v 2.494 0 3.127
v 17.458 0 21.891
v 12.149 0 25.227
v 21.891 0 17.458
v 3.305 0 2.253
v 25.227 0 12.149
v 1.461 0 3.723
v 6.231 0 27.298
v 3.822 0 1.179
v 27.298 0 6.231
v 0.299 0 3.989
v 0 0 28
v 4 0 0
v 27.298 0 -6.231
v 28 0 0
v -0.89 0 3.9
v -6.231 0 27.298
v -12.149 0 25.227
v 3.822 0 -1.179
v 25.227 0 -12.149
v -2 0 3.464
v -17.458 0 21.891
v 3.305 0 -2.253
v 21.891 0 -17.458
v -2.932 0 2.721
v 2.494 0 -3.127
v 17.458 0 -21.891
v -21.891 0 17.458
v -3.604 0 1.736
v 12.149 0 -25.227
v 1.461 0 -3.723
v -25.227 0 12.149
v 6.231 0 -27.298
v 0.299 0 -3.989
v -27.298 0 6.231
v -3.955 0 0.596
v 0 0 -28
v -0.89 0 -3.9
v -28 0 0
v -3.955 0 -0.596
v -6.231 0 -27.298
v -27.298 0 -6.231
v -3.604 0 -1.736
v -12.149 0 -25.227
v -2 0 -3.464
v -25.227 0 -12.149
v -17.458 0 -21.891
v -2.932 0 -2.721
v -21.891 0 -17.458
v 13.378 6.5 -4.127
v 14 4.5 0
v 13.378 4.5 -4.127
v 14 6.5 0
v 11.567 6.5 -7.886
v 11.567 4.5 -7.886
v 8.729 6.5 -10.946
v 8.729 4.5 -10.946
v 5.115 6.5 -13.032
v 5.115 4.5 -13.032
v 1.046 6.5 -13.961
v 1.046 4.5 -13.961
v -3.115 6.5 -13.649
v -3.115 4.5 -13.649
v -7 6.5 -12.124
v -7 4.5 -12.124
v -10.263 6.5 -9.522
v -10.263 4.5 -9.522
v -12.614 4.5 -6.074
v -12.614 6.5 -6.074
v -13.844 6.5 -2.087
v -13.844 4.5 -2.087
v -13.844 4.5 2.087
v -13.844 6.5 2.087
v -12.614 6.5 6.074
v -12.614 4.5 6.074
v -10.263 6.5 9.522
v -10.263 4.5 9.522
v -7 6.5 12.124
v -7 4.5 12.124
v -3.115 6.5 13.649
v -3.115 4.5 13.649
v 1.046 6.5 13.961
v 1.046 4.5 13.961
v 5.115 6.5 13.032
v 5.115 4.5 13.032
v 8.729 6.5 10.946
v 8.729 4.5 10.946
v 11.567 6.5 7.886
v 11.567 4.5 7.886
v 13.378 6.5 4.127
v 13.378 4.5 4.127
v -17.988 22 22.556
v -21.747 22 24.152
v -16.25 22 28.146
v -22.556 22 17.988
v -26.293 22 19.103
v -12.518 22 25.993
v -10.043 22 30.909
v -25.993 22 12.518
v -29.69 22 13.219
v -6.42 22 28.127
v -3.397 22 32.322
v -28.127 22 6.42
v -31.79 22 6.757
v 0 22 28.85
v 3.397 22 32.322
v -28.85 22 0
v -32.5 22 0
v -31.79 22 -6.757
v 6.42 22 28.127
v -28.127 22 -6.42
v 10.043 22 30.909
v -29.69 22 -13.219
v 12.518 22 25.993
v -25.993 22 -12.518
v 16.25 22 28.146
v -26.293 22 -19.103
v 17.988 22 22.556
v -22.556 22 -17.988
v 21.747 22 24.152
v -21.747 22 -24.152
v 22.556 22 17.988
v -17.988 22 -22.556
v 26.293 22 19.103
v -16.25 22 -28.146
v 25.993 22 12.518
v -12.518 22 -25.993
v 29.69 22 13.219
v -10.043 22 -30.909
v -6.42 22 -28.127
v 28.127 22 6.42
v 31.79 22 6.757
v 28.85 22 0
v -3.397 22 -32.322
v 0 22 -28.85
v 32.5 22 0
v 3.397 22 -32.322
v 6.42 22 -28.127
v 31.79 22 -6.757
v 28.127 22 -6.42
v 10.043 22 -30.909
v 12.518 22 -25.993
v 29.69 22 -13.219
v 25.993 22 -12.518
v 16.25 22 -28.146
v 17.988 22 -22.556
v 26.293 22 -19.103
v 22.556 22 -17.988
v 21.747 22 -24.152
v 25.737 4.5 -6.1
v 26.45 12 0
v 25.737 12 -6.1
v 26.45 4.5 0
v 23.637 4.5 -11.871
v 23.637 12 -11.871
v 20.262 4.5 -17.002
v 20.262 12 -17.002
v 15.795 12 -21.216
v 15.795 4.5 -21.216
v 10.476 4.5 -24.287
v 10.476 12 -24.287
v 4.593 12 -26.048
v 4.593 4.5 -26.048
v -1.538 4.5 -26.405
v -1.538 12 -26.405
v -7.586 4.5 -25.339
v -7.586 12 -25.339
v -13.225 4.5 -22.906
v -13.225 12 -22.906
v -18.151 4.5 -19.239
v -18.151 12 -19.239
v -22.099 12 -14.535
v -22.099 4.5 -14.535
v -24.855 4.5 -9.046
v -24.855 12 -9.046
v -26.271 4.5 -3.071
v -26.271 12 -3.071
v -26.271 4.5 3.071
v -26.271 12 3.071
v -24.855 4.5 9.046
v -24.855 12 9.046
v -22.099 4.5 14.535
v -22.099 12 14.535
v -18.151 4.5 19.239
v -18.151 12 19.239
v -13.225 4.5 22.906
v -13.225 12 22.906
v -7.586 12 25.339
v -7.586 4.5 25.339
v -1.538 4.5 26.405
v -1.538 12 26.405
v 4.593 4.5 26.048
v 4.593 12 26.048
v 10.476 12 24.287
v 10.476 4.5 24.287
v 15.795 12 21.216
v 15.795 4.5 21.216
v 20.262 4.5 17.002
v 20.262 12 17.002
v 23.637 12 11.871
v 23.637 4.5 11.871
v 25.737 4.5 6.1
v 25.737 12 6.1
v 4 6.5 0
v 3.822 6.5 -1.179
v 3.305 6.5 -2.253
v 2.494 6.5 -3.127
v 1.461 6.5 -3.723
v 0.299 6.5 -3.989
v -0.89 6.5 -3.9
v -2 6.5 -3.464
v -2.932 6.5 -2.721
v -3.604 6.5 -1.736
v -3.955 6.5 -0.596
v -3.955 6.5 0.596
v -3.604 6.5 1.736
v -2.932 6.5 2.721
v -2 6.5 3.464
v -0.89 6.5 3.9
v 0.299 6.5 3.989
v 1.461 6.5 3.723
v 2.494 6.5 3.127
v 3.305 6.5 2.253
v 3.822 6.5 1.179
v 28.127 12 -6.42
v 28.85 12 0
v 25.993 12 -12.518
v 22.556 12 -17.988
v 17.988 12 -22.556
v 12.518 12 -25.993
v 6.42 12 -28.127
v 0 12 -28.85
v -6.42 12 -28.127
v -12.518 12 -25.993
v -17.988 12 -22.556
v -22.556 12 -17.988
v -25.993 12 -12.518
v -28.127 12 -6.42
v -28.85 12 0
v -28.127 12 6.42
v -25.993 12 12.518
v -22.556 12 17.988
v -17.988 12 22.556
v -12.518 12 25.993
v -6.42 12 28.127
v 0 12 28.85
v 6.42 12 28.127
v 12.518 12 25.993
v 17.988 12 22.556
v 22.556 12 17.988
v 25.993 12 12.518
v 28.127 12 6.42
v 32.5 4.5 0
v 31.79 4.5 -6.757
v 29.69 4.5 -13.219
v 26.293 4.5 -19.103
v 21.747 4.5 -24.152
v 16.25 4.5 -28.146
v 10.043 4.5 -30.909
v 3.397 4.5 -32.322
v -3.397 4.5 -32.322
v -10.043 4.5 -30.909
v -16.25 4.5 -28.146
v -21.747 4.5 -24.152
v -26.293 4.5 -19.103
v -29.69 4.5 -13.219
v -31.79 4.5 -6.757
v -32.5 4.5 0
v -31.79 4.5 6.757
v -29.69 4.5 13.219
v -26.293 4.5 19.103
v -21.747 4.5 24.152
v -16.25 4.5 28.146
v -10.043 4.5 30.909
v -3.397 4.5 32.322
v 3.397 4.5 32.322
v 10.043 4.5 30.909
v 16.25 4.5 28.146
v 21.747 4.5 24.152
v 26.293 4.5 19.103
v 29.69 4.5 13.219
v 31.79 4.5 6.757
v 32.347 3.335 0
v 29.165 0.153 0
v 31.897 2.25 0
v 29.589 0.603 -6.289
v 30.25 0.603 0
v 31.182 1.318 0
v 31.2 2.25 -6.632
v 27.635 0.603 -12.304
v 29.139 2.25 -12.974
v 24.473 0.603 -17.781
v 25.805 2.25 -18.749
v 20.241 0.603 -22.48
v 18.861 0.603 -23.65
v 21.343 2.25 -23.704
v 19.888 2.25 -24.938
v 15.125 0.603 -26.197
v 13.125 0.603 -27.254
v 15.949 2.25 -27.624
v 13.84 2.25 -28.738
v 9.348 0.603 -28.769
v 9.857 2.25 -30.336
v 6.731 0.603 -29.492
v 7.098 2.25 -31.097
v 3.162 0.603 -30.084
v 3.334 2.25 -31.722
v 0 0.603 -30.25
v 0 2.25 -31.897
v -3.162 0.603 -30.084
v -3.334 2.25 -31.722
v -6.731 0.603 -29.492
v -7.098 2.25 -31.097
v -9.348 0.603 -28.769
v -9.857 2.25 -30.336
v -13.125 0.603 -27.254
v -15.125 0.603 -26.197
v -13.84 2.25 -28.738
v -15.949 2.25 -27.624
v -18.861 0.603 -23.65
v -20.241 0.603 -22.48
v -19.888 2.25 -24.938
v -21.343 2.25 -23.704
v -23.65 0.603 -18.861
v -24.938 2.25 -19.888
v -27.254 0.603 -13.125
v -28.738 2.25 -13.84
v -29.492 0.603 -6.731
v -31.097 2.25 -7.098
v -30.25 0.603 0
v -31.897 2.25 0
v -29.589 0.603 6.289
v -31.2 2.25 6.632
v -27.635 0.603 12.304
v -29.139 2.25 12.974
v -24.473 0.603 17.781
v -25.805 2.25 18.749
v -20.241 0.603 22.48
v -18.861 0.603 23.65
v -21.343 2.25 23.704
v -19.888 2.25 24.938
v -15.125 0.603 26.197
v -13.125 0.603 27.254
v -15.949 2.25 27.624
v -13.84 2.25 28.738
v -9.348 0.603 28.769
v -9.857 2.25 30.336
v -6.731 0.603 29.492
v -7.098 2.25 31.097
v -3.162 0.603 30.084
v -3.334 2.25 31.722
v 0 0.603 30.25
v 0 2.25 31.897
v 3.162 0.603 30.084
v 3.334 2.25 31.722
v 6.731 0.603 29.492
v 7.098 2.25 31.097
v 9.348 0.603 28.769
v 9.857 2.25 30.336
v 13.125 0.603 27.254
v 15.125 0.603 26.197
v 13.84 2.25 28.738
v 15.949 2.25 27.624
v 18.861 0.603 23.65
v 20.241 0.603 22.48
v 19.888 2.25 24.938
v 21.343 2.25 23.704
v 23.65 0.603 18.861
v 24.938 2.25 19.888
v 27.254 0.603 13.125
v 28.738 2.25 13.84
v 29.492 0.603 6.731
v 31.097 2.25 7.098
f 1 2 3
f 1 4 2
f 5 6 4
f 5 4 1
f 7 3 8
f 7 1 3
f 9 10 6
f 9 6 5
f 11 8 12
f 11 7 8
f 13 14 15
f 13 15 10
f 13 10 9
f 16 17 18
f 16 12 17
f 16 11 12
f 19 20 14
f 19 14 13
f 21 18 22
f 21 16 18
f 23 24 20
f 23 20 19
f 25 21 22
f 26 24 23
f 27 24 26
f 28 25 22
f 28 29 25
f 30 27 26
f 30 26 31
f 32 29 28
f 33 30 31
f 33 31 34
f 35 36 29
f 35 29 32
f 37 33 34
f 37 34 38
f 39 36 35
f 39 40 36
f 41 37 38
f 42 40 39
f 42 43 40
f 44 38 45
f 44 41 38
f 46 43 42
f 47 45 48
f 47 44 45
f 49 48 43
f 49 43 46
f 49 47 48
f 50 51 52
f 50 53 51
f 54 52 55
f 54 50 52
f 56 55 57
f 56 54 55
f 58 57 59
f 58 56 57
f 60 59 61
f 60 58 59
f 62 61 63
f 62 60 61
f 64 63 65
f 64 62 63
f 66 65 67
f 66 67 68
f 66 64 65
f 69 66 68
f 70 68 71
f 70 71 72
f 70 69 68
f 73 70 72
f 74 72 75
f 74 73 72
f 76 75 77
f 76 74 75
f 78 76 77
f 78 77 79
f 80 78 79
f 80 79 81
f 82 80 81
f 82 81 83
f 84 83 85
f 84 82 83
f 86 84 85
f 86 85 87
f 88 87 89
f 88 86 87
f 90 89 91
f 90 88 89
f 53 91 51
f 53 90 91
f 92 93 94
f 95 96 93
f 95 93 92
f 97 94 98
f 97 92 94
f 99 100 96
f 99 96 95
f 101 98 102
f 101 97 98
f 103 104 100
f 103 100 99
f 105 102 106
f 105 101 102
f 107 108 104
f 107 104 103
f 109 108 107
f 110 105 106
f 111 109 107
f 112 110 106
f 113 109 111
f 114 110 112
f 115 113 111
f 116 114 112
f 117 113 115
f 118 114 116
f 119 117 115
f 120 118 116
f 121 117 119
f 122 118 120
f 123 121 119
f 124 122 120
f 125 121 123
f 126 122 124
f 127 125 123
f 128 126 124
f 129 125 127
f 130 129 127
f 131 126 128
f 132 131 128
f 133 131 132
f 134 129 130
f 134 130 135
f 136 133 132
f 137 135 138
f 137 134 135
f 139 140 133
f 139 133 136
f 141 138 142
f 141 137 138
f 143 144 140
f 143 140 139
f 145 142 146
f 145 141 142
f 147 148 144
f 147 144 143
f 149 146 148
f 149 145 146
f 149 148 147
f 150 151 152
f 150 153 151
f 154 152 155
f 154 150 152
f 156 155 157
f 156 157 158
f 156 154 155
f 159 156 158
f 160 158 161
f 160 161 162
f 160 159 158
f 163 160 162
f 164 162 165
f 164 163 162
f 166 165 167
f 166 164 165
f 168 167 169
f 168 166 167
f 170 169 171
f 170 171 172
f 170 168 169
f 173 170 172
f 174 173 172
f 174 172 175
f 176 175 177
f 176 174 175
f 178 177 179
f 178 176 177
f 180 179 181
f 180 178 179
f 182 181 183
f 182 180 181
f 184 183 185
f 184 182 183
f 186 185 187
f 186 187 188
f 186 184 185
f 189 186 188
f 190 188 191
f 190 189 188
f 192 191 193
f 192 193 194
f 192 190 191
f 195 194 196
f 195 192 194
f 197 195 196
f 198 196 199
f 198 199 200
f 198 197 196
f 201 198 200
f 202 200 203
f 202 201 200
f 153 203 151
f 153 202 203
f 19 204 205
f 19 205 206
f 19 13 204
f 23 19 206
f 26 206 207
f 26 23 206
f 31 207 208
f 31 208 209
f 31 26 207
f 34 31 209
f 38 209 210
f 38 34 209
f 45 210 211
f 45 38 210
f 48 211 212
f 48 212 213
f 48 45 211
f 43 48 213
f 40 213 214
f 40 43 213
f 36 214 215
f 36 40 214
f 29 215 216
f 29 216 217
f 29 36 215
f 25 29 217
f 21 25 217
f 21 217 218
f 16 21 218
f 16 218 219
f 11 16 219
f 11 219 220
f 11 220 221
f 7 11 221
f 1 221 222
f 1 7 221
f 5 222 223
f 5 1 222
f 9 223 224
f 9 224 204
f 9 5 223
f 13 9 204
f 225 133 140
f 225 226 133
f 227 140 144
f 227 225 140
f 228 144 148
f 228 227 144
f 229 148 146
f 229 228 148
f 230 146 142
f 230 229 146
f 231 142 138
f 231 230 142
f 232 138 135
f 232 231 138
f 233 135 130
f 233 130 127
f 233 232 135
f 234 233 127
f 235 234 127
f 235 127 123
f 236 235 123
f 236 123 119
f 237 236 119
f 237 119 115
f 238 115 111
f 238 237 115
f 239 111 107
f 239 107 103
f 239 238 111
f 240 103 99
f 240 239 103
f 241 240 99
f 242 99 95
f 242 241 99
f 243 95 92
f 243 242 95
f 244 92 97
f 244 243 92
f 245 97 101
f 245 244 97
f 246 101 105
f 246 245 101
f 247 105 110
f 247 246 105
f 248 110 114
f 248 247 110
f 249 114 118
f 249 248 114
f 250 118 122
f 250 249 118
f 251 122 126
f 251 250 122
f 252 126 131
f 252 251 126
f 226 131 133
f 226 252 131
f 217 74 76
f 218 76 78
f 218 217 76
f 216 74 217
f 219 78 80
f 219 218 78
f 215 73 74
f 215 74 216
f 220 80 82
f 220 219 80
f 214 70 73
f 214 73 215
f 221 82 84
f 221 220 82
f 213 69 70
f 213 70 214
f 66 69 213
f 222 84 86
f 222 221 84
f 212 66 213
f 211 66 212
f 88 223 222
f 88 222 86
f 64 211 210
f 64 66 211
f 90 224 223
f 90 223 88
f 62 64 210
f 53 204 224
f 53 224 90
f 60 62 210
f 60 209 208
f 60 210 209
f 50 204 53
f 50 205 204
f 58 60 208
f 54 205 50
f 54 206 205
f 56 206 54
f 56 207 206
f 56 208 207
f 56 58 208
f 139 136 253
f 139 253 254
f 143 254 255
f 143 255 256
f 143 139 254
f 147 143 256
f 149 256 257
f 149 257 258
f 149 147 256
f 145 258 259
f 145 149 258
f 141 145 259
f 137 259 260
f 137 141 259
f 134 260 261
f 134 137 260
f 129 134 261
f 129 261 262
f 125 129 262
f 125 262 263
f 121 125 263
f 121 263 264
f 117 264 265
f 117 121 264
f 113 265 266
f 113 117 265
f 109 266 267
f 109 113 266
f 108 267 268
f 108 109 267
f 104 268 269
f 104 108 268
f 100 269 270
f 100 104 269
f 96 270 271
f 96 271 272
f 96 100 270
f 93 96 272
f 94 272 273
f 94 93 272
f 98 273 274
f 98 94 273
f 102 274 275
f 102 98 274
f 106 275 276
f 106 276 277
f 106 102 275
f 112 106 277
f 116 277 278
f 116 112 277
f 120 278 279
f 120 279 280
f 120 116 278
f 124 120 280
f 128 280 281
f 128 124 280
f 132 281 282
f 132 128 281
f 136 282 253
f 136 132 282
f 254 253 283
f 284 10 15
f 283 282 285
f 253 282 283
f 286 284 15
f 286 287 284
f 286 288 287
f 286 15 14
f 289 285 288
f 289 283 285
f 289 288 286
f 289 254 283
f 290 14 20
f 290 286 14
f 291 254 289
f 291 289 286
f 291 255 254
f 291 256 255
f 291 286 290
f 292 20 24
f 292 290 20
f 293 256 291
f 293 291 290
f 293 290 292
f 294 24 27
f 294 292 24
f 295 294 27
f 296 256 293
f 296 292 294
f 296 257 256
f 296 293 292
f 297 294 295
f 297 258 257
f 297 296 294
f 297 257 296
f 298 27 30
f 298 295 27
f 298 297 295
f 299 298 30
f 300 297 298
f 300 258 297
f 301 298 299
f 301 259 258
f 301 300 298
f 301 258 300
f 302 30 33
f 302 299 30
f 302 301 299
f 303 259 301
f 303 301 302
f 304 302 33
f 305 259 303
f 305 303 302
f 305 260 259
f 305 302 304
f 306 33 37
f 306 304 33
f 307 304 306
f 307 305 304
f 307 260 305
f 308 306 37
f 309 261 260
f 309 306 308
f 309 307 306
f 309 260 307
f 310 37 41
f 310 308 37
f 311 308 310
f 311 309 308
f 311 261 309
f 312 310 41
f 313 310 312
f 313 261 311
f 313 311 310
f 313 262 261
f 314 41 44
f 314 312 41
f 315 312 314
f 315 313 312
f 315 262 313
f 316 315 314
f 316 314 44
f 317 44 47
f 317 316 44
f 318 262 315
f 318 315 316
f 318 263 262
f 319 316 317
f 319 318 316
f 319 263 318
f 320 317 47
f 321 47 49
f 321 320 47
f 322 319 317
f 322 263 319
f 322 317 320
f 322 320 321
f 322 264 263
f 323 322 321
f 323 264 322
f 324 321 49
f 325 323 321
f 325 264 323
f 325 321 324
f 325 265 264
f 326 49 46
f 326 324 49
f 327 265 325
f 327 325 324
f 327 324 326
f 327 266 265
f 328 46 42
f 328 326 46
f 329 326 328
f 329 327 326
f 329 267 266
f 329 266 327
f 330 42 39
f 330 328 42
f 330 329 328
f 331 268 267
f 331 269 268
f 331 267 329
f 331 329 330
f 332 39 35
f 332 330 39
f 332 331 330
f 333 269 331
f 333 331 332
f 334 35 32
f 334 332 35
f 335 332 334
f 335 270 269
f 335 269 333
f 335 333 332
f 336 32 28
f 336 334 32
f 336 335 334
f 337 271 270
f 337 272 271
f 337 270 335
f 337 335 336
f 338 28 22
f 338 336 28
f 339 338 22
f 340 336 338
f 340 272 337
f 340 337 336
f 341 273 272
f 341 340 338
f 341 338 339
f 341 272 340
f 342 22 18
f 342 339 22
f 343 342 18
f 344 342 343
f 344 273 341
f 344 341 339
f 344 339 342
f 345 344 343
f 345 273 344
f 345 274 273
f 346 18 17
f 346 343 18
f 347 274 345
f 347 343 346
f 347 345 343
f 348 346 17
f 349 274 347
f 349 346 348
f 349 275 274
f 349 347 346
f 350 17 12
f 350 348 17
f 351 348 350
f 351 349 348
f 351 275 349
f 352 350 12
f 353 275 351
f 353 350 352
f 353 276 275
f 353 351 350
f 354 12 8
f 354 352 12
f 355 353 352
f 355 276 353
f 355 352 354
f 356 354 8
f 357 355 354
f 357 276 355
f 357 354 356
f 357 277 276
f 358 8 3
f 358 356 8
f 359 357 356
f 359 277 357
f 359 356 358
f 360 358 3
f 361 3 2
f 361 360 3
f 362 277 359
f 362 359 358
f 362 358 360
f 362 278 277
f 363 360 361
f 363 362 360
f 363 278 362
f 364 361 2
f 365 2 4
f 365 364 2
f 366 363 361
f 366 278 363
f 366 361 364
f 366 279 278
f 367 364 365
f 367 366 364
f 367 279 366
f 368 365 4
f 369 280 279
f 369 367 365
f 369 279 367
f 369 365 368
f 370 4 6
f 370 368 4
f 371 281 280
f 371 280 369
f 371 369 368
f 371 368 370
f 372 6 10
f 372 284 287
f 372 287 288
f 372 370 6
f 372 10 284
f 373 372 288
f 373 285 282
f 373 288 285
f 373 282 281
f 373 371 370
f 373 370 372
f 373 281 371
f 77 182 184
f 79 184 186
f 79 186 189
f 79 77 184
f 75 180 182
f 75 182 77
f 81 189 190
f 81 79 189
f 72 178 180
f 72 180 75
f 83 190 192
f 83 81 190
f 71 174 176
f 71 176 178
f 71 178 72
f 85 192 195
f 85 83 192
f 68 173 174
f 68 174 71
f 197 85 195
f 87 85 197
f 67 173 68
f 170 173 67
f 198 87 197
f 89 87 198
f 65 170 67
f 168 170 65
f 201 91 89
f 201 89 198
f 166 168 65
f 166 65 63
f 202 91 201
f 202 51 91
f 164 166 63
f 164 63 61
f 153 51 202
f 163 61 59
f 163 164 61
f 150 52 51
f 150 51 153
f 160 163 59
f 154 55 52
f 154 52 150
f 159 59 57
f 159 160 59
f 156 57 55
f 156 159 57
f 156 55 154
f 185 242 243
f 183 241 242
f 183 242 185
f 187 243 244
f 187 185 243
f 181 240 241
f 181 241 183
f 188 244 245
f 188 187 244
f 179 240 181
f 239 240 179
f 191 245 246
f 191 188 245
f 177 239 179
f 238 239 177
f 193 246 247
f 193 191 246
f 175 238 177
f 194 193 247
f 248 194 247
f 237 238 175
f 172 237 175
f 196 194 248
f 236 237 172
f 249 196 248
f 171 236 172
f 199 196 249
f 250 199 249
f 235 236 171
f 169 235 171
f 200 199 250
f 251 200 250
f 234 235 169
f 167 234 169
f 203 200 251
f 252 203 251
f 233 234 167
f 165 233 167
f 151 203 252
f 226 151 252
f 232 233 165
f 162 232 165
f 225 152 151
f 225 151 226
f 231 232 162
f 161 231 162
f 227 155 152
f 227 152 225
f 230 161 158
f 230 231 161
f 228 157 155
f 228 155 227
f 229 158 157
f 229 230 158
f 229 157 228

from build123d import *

# Parameters (mm, degrees)
FILLET1_R = 4.5


with BuildPart() as part:
    # Sketch2 → Revolve1 (revolve)
    with BuildSketch(Plane.XY):
        Polygon((4, 0), (28.52273273, 0), (32.5, 0), (32.5, 10), (32.5, 22), (28.85, 22), (28.85, 12), (26.45, 12), (26.45, 4.5), (14, 4.5), (14, 6.5), (4, 6.5), (4, 4), align=None)
    revolve(axis=Axis((0, 0, 0), (0, 1, 0)))

    # Fillet1
    fillet1_edges = [part.edges().sort_by_distance(p)[0] for p in [
        (-32.5, 0, 0),
    ]]
    fillet(fillet1_edges, radius=FILLET1_R)


solid = part.part
